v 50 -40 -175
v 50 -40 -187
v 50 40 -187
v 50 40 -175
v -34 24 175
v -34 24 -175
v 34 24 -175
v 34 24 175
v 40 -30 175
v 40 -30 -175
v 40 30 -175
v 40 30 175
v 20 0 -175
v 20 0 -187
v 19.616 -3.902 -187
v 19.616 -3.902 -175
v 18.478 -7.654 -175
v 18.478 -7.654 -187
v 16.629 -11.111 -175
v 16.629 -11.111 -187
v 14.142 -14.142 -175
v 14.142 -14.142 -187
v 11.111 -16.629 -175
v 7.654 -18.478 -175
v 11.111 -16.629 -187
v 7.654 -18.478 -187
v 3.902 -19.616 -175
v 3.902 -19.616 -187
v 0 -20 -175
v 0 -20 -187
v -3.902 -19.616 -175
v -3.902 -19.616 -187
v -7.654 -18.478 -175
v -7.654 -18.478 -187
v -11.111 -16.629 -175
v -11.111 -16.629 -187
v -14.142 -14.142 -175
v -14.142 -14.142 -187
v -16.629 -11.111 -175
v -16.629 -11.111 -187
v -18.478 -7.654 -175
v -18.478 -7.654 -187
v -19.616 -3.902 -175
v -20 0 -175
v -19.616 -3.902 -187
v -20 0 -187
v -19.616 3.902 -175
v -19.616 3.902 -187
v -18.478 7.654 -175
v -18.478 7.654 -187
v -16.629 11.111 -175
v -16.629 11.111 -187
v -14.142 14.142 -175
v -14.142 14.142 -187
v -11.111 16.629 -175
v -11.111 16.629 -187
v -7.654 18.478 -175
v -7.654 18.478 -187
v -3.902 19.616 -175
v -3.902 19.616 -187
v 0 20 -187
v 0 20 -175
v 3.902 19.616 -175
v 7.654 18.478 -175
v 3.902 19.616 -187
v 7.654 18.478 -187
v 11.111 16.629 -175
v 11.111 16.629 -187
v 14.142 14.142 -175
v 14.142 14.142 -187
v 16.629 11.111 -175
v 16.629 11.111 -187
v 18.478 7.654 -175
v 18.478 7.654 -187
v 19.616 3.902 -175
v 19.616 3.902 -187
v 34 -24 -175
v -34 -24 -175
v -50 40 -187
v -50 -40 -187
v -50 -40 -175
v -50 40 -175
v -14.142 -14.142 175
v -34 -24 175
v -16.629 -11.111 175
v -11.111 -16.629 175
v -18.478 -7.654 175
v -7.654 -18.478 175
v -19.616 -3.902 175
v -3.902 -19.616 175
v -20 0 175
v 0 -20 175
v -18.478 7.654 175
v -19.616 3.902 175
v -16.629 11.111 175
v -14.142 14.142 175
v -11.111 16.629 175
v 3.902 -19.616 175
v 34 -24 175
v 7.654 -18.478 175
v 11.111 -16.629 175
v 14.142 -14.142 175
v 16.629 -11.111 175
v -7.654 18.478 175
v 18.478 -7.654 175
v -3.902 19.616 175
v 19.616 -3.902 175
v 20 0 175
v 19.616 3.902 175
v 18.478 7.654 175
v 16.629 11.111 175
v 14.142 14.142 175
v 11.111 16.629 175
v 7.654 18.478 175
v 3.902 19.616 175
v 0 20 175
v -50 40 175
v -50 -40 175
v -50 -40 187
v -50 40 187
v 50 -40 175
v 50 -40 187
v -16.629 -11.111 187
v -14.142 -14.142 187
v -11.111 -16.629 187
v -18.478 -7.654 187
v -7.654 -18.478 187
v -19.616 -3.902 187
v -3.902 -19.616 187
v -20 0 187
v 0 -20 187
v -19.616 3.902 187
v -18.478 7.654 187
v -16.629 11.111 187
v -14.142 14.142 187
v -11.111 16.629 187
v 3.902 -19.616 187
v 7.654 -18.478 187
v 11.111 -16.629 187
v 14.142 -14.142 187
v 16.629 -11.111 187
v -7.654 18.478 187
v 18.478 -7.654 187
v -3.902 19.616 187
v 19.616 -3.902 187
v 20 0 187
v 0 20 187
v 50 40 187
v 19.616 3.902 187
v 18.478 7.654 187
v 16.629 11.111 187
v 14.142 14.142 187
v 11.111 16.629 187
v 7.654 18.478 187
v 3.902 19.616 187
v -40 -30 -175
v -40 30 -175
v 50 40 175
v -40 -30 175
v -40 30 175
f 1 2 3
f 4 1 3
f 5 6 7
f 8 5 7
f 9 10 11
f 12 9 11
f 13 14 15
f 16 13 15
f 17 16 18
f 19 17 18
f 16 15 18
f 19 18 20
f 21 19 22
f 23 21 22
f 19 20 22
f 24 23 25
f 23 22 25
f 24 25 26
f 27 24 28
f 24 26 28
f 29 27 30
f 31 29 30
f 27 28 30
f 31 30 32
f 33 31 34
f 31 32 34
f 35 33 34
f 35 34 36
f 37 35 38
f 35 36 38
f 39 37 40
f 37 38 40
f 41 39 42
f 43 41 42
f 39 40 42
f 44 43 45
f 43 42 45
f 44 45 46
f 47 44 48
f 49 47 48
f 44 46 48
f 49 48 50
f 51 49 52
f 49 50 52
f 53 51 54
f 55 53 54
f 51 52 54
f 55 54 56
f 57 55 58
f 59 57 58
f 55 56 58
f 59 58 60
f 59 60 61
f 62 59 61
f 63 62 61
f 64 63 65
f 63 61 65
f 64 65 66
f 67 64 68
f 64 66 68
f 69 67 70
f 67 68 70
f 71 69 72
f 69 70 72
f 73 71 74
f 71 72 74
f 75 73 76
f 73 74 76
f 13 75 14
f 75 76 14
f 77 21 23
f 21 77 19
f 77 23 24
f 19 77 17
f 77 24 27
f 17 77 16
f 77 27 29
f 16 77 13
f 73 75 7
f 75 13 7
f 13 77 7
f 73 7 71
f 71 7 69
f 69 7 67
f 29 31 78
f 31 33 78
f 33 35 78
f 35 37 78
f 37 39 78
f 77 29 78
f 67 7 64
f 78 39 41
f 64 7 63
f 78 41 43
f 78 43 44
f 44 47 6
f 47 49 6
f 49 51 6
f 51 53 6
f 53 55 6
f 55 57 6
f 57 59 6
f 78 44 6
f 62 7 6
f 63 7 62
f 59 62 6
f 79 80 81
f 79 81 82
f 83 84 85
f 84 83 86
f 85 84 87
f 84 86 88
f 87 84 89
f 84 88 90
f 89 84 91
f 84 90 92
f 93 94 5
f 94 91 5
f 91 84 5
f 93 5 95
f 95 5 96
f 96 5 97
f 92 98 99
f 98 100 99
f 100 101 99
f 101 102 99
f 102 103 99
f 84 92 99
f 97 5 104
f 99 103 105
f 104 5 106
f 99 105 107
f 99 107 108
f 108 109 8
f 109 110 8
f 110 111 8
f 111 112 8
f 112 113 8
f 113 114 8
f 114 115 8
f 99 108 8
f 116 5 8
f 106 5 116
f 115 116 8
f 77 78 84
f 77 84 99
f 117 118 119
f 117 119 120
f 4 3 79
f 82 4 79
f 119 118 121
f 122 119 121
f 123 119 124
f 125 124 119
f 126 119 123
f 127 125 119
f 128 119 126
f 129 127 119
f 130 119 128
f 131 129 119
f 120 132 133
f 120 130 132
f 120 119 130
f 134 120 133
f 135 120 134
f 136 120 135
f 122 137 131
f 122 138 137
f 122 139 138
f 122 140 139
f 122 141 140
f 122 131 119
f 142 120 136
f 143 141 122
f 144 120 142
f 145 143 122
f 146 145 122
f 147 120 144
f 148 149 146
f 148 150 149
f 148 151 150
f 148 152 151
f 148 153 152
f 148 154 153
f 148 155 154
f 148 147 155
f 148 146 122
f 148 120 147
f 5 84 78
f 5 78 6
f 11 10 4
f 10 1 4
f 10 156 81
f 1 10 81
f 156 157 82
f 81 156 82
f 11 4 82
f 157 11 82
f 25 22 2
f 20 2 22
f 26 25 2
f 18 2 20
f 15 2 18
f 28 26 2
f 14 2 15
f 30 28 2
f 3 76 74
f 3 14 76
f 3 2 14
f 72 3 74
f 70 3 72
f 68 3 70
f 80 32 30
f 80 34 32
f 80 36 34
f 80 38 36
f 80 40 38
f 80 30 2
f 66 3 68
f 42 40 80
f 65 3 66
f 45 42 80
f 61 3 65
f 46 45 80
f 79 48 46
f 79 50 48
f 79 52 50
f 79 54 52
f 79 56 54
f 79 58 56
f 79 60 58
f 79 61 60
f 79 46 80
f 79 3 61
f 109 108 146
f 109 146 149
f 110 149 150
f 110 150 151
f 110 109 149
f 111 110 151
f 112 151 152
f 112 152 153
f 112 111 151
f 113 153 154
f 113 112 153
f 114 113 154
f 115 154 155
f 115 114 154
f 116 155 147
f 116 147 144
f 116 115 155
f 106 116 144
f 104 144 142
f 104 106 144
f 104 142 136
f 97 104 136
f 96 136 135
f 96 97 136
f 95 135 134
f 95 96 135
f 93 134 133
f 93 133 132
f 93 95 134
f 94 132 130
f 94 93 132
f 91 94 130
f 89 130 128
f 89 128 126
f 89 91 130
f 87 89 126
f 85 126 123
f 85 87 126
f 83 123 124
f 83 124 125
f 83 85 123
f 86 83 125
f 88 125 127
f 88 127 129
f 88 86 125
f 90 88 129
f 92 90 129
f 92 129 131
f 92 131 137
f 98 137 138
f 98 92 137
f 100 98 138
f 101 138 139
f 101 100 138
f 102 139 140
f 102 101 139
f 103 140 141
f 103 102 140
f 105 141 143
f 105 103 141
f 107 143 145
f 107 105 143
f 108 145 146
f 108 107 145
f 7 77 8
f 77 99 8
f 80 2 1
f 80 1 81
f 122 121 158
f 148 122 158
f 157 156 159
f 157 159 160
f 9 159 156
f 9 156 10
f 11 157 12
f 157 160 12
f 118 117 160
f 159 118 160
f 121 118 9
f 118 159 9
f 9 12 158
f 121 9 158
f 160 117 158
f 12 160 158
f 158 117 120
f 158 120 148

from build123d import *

# Parameters (mm, degrees)
SKETCH_8_W      = 80
SKETCH_8_H      = 60
SKETCH_8_W_2    = 68
SKETCH_8_H_2    = 48
EXTRUDE_1_DEPTH = 175
SKETCH_9_W      = 100
SKETCH_9_H      = 80
SKETCH_9_R      = 20
EXTRUDE_2_DEPTH = 12
EXTRUDE_START   = 12
SKETCH_10_W     = 100
SKETCH_10_H     = 80
SKETCH_10_R     = 20
EXTRUDE_3_DEPTH = 12


with BuildPart() as part:
    # 草图8 → 凸台-拉伸1 (new, symmetric)
    with BuildSketch(Plane.XY):
        Rectangle(SKETCH_8_W, SKETCH_8_H)
        Rectangle(SKETCH_8_W_2, SKETCH_8_H_2, mode=Mode.SUBTRACT)
    extrude(amount=EXTRUDE_1_DEPTH, both=True)

    # 草图9 → 凸台-拉伸2 (add)
    with BuildSketch(Plane.XY.offset(175)):
        Rectangle(SKETCH_9_W, SKETCH_9_H)
        Circle(SKETCH_9_R, mode=Mode.SUBTRACT)
    extrude(amount=EXTRUDE_2_DEPTH)

    # 草图10 → 凸台-拉伸3 (add)
    with BuildSketch(Plane(origin=(0, 0, -175), x_dir=(-1, 0, 0), z_dir=(0, 0, -1)).offset(EXTRUDE_START)):
        Rectangle(SKETCH_10_W, SKETCH_10_H)
        with Locations(Location((0, 0, 0), (0, 0, 180))):
            Circle(SKETCH_10_R, mode=Mode.SUBTRACT)
    extrude(amount=-EXTRUDE_3_DEPTH)


solid = part.part
